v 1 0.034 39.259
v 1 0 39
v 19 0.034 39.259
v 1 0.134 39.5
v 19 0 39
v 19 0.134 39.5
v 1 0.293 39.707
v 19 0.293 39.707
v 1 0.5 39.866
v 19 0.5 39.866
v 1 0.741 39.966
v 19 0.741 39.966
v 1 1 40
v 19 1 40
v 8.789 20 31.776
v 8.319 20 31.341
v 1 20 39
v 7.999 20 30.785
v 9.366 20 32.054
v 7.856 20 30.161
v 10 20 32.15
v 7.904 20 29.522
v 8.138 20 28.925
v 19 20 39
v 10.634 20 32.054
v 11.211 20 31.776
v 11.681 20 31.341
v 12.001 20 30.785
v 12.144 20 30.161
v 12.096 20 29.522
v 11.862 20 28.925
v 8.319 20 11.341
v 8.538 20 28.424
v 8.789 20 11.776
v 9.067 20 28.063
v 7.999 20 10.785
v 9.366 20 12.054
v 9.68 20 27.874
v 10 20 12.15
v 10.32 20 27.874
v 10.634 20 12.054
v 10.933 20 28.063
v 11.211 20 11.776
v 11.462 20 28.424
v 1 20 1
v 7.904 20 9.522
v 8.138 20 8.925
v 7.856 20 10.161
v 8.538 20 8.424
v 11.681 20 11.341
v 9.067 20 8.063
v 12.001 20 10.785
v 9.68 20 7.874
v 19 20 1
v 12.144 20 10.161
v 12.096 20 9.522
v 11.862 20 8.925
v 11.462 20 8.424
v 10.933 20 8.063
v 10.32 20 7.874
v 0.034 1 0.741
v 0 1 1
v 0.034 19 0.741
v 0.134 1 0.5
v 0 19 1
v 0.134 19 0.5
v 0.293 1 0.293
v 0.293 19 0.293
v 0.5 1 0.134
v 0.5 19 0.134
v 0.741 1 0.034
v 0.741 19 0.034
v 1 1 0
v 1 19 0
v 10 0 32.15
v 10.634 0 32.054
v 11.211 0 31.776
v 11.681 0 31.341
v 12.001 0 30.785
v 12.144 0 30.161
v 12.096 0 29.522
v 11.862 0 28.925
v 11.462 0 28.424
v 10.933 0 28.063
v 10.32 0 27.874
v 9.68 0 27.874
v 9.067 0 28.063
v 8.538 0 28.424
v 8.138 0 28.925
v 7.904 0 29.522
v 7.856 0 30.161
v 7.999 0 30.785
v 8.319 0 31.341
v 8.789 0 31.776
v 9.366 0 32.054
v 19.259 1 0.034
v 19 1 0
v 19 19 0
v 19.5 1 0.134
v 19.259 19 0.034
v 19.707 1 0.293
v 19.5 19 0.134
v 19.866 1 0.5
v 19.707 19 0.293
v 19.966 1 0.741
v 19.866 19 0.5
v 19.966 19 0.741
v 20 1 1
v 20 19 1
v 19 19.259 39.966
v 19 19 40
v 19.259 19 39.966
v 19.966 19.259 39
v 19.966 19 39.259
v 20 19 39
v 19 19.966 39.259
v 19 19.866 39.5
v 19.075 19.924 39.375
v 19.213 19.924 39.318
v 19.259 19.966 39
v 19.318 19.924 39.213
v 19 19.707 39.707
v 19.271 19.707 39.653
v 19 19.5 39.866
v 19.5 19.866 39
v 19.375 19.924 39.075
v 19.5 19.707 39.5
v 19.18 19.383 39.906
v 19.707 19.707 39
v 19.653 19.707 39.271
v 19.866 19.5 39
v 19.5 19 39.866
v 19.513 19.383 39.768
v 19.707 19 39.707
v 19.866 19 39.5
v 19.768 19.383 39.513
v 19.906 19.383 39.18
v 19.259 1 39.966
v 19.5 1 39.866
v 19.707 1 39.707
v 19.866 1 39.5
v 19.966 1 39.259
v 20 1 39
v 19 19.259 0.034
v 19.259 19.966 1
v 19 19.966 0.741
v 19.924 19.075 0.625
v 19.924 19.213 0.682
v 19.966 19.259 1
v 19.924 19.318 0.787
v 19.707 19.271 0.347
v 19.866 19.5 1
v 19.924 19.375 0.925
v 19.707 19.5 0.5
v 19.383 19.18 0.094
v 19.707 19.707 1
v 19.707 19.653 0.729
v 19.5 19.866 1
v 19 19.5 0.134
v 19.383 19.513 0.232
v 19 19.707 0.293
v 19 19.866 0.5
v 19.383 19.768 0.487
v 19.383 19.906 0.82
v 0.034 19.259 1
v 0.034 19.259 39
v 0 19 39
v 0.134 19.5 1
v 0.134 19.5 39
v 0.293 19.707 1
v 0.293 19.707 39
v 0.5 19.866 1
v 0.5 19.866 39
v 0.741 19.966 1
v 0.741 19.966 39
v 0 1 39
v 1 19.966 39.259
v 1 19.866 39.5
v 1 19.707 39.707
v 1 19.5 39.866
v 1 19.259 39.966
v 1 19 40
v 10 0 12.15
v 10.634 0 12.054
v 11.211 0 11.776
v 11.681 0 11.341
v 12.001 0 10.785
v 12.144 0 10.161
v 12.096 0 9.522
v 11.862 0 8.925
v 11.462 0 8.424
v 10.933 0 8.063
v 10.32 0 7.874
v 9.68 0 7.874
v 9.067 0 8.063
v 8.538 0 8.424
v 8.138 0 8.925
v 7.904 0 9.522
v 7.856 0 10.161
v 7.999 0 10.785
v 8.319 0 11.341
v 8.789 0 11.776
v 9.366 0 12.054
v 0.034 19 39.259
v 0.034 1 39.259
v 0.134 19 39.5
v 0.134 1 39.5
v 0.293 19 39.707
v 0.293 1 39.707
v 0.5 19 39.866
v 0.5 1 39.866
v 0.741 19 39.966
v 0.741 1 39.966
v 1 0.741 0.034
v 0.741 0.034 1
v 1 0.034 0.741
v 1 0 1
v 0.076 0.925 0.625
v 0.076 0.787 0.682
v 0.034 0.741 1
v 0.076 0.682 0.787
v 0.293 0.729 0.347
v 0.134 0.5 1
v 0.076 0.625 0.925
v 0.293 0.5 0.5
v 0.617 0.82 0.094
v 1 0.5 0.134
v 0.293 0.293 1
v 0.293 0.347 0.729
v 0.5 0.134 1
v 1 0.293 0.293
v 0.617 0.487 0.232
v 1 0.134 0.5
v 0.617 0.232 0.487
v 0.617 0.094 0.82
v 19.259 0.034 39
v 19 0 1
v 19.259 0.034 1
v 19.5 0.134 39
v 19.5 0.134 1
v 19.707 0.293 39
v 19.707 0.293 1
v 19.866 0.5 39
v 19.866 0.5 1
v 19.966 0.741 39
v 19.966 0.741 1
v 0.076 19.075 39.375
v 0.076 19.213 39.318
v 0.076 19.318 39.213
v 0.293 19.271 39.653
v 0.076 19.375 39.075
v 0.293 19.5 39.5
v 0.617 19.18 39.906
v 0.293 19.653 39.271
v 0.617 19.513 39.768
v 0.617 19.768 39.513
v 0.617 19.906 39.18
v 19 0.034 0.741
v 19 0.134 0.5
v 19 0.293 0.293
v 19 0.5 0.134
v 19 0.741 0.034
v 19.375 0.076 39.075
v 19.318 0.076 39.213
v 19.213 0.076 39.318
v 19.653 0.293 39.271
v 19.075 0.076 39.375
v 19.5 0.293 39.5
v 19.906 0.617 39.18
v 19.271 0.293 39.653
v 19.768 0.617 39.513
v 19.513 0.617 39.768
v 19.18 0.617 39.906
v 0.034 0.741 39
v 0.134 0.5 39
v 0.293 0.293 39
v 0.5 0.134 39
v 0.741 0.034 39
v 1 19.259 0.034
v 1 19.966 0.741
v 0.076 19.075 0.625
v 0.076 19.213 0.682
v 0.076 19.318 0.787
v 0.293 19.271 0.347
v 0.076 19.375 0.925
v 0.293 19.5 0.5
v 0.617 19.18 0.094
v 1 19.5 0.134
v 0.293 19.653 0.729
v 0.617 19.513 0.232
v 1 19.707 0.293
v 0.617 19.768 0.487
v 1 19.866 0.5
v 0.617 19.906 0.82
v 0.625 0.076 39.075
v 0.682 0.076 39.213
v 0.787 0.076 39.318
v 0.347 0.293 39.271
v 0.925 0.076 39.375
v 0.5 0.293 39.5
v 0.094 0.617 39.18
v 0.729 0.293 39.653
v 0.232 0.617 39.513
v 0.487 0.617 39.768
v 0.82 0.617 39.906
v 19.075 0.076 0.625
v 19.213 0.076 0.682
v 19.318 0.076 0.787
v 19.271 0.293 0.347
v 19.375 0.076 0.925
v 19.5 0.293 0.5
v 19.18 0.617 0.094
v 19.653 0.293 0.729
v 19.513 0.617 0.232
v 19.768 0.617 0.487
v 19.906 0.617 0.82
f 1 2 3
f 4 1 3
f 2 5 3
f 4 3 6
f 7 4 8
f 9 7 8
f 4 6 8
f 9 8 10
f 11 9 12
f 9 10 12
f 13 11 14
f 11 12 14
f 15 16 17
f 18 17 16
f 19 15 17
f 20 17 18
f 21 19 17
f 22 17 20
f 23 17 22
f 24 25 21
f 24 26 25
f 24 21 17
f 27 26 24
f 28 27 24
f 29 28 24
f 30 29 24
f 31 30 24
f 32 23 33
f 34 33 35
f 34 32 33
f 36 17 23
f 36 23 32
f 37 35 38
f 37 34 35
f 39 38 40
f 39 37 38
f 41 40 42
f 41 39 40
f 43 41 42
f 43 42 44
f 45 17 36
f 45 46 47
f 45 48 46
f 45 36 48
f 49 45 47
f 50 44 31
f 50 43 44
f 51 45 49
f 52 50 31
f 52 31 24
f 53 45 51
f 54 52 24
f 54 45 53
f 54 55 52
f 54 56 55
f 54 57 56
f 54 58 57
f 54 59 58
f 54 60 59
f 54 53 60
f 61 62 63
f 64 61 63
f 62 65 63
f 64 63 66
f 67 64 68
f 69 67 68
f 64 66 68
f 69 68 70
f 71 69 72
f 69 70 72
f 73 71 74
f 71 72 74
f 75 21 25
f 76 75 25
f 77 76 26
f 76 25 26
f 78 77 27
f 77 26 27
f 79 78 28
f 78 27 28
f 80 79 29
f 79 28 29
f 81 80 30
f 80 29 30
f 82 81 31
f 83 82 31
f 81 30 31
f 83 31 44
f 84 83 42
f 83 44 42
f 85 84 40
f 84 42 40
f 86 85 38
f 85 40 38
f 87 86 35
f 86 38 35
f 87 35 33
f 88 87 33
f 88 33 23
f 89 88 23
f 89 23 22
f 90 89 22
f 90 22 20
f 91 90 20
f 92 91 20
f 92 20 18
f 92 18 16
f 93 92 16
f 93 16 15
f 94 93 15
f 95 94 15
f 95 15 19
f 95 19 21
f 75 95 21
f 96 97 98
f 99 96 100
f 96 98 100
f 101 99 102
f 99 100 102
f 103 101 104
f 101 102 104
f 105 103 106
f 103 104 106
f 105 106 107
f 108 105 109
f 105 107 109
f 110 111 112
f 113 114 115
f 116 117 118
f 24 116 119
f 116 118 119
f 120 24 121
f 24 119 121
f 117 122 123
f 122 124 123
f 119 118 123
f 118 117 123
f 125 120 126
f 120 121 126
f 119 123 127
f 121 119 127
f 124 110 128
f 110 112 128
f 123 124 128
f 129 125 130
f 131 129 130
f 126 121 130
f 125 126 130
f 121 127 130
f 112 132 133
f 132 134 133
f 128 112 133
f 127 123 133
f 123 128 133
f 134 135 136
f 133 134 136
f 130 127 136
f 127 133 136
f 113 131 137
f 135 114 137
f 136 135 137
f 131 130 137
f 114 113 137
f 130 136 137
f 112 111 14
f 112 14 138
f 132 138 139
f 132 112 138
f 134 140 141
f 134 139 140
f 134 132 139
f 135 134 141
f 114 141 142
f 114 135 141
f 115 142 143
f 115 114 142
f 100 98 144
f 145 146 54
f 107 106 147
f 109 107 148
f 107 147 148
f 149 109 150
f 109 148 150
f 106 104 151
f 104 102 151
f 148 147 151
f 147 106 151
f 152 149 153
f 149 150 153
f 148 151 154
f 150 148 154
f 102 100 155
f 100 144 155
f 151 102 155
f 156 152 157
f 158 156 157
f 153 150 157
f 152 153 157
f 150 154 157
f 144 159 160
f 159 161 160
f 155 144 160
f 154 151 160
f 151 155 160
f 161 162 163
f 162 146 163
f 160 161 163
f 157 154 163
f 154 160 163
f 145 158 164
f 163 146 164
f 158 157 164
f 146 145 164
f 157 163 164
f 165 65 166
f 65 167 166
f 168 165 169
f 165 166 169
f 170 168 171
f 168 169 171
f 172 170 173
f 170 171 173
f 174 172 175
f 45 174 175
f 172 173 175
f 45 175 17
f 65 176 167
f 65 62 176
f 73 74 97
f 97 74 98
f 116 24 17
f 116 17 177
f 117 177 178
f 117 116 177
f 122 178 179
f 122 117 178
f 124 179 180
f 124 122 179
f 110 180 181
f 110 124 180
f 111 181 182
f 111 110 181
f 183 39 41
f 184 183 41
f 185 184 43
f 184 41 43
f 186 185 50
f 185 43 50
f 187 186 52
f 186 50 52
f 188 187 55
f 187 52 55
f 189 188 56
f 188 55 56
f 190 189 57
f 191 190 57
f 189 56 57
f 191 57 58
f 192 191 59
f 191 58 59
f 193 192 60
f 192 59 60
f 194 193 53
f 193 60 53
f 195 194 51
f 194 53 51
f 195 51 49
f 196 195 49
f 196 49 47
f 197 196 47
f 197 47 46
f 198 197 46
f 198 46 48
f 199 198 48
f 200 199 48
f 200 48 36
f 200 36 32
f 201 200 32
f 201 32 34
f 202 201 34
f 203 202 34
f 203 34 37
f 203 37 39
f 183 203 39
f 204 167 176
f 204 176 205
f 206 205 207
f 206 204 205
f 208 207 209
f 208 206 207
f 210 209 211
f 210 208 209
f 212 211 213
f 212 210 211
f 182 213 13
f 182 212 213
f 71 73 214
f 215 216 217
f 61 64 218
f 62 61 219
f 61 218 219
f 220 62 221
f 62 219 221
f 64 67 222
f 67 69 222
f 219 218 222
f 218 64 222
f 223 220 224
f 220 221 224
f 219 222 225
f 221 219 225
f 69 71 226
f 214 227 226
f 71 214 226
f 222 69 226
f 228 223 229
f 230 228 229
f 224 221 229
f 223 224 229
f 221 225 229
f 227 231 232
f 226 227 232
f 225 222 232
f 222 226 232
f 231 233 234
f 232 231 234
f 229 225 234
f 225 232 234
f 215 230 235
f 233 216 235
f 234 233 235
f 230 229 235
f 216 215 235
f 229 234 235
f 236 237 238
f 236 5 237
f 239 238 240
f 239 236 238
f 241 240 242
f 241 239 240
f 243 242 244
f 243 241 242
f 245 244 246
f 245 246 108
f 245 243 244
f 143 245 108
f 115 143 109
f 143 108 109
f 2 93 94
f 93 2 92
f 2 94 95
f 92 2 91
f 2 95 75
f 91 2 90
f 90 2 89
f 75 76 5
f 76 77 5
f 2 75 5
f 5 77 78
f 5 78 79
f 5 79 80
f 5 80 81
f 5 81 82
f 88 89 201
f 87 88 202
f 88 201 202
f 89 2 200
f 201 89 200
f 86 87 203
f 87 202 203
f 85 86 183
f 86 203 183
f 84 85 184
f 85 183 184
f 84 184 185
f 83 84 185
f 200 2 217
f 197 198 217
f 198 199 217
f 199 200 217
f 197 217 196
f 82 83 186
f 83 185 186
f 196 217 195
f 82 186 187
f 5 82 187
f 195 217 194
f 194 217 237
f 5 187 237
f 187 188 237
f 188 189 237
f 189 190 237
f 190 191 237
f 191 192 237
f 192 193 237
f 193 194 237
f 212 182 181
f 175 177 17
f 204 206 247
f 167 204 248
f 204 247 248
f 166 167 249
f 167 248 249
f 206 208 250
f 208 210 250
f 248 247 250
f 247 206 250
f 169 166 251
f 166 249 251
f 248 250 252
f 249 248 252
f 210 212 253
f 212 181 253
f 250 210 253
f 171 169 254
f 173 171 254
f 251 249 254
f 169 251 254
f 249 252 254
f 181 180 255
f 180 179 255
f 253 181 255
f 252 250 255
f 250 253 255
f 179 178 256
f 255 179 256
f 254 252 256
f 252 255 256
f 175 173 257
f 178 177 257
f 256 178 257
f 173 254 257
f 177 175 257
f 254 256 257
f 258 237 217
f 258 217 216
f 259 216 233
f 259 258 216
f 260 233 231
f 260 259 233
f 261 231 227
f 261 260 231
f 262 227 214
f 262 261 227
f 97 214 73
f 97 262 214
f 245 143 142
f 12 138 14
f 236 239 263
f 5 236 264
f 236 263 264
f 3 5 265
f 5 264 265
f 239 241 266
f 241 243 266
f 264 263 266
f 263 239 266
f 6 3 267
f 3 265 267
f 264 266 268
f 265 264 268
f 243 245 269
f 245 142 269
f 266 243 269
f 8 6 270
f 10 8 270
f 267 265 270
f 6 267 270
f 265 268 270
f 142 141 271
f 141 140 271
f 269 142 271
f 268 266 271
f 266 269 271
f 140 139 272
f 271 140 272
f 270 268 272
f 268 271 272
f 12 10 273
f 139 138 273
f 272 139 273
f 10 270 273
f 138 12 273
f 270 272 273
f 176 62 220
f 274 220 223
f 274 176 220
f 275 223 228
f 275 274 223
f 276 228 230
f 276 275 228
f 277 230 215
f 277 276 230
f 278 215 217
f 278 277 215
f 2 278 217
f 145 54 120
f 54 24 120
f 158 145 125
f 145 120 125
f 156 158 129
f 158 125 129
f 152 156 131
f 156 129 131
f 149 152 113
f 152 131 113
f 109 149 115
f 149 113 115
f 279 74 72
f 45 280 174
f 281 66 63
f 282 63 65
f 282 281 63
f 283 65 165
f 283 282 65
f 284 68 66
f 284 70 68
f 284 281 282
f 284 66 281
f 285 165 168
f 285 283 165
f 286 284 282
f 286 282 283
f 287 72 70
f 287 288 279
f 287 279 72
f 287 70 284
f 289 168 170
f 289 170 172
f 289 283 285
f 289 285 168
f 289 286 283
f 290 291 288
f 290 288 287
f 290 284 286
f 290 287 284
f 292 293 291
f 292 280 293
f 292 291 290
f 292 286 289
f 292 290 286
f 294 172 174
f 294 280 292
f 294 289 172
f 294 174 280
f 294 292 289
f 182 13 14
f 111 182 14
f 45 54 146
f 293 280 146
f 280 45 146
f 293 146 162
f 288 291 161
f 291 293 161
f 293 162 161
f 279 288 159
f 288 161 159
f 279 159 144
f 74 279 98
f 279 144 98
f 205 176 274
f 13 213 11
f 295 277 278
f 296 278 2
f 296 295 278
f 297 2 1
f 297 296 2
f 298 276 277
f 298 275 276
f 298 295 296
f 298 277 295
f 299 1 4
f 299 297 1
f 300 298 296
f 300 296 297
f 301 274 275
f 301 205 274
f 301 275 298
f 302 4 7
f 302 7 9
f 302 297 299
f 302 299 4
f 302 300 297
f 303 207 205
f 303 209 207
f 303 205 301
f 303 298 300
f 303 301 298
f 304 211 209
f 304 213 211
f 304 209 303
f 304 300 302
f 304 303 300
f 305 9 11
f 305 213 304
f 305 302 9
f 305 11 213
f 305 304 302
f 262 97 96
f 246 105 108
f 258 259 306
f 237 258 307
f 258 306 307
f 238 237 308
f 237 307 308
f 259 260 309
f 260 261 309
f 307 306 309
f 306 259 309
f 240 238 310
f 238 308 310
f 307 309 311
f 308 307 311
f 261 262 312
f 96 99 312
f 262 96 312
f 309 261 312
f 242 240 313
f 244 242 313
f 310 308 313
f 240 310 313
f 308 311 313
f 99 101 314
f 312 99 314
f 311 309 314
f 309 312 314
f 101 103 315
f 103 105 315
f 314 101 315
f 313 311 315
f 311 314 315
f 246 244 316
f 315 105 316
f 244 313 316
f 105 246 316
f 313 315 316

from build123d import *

# Parameters (mm, degrees)
SKETCH_1_W          = 20
SKETCH_1_H          = 20
EXTRUDE_1_DEPTH     = 40
SKETCH_2_R          = 2.15
CUT_EXTRUDE_1_DEPTH = 40
FILLET_2_R          = 1


with BuildPart() as part:
    # 草图1 → 凸台-拉伸1 (new body)
    with BuildSketch(Plane.XY):
        with Locations((10, 10)):
            Rectangle(SKETCH_1_W, SKETCH_1_H)
    extrude(amount=EXTRUDE_1_DEPTH)

    # 草图2 → 切除-拉伸1 (cut)
    with BuildSketch(Plane(origin=(0, 20, 0), x_dir=(1, 0, 0), z_dir=(0, 1, 0))):
        with Locations(Location((10, -30, 0), (0, 0, 270))):
            Circle(SKETCH_2_R)
        with Locations(Location((10, -10, 0), (0, 0, 270))):
            Circle(SKETCH_2_R)
    extrude(amount=-CUT_EXTRUDE_1_DEPTH, mode=Mode.SUBTRACT)

    # 圆角2
    fillet_2_edges = [part.edges().sort_by_distance(p)[0] for p in [
        (20, 10, 40),
        (10, 20, 40),
        (0, 10, 40),
        (10, 20, 0),
        (20, 10, 0),
        (10, 0, 0),
        (0, 10, 0),
        (0, 20, 20),
        (20, 20, 20),
        (20, 0, 20),
        (0, 0, 20),
        (10, 0, 40),
    ]]
    fillet(fillet_2_edges, radius=FILLET_2_R)


solid = part.part
